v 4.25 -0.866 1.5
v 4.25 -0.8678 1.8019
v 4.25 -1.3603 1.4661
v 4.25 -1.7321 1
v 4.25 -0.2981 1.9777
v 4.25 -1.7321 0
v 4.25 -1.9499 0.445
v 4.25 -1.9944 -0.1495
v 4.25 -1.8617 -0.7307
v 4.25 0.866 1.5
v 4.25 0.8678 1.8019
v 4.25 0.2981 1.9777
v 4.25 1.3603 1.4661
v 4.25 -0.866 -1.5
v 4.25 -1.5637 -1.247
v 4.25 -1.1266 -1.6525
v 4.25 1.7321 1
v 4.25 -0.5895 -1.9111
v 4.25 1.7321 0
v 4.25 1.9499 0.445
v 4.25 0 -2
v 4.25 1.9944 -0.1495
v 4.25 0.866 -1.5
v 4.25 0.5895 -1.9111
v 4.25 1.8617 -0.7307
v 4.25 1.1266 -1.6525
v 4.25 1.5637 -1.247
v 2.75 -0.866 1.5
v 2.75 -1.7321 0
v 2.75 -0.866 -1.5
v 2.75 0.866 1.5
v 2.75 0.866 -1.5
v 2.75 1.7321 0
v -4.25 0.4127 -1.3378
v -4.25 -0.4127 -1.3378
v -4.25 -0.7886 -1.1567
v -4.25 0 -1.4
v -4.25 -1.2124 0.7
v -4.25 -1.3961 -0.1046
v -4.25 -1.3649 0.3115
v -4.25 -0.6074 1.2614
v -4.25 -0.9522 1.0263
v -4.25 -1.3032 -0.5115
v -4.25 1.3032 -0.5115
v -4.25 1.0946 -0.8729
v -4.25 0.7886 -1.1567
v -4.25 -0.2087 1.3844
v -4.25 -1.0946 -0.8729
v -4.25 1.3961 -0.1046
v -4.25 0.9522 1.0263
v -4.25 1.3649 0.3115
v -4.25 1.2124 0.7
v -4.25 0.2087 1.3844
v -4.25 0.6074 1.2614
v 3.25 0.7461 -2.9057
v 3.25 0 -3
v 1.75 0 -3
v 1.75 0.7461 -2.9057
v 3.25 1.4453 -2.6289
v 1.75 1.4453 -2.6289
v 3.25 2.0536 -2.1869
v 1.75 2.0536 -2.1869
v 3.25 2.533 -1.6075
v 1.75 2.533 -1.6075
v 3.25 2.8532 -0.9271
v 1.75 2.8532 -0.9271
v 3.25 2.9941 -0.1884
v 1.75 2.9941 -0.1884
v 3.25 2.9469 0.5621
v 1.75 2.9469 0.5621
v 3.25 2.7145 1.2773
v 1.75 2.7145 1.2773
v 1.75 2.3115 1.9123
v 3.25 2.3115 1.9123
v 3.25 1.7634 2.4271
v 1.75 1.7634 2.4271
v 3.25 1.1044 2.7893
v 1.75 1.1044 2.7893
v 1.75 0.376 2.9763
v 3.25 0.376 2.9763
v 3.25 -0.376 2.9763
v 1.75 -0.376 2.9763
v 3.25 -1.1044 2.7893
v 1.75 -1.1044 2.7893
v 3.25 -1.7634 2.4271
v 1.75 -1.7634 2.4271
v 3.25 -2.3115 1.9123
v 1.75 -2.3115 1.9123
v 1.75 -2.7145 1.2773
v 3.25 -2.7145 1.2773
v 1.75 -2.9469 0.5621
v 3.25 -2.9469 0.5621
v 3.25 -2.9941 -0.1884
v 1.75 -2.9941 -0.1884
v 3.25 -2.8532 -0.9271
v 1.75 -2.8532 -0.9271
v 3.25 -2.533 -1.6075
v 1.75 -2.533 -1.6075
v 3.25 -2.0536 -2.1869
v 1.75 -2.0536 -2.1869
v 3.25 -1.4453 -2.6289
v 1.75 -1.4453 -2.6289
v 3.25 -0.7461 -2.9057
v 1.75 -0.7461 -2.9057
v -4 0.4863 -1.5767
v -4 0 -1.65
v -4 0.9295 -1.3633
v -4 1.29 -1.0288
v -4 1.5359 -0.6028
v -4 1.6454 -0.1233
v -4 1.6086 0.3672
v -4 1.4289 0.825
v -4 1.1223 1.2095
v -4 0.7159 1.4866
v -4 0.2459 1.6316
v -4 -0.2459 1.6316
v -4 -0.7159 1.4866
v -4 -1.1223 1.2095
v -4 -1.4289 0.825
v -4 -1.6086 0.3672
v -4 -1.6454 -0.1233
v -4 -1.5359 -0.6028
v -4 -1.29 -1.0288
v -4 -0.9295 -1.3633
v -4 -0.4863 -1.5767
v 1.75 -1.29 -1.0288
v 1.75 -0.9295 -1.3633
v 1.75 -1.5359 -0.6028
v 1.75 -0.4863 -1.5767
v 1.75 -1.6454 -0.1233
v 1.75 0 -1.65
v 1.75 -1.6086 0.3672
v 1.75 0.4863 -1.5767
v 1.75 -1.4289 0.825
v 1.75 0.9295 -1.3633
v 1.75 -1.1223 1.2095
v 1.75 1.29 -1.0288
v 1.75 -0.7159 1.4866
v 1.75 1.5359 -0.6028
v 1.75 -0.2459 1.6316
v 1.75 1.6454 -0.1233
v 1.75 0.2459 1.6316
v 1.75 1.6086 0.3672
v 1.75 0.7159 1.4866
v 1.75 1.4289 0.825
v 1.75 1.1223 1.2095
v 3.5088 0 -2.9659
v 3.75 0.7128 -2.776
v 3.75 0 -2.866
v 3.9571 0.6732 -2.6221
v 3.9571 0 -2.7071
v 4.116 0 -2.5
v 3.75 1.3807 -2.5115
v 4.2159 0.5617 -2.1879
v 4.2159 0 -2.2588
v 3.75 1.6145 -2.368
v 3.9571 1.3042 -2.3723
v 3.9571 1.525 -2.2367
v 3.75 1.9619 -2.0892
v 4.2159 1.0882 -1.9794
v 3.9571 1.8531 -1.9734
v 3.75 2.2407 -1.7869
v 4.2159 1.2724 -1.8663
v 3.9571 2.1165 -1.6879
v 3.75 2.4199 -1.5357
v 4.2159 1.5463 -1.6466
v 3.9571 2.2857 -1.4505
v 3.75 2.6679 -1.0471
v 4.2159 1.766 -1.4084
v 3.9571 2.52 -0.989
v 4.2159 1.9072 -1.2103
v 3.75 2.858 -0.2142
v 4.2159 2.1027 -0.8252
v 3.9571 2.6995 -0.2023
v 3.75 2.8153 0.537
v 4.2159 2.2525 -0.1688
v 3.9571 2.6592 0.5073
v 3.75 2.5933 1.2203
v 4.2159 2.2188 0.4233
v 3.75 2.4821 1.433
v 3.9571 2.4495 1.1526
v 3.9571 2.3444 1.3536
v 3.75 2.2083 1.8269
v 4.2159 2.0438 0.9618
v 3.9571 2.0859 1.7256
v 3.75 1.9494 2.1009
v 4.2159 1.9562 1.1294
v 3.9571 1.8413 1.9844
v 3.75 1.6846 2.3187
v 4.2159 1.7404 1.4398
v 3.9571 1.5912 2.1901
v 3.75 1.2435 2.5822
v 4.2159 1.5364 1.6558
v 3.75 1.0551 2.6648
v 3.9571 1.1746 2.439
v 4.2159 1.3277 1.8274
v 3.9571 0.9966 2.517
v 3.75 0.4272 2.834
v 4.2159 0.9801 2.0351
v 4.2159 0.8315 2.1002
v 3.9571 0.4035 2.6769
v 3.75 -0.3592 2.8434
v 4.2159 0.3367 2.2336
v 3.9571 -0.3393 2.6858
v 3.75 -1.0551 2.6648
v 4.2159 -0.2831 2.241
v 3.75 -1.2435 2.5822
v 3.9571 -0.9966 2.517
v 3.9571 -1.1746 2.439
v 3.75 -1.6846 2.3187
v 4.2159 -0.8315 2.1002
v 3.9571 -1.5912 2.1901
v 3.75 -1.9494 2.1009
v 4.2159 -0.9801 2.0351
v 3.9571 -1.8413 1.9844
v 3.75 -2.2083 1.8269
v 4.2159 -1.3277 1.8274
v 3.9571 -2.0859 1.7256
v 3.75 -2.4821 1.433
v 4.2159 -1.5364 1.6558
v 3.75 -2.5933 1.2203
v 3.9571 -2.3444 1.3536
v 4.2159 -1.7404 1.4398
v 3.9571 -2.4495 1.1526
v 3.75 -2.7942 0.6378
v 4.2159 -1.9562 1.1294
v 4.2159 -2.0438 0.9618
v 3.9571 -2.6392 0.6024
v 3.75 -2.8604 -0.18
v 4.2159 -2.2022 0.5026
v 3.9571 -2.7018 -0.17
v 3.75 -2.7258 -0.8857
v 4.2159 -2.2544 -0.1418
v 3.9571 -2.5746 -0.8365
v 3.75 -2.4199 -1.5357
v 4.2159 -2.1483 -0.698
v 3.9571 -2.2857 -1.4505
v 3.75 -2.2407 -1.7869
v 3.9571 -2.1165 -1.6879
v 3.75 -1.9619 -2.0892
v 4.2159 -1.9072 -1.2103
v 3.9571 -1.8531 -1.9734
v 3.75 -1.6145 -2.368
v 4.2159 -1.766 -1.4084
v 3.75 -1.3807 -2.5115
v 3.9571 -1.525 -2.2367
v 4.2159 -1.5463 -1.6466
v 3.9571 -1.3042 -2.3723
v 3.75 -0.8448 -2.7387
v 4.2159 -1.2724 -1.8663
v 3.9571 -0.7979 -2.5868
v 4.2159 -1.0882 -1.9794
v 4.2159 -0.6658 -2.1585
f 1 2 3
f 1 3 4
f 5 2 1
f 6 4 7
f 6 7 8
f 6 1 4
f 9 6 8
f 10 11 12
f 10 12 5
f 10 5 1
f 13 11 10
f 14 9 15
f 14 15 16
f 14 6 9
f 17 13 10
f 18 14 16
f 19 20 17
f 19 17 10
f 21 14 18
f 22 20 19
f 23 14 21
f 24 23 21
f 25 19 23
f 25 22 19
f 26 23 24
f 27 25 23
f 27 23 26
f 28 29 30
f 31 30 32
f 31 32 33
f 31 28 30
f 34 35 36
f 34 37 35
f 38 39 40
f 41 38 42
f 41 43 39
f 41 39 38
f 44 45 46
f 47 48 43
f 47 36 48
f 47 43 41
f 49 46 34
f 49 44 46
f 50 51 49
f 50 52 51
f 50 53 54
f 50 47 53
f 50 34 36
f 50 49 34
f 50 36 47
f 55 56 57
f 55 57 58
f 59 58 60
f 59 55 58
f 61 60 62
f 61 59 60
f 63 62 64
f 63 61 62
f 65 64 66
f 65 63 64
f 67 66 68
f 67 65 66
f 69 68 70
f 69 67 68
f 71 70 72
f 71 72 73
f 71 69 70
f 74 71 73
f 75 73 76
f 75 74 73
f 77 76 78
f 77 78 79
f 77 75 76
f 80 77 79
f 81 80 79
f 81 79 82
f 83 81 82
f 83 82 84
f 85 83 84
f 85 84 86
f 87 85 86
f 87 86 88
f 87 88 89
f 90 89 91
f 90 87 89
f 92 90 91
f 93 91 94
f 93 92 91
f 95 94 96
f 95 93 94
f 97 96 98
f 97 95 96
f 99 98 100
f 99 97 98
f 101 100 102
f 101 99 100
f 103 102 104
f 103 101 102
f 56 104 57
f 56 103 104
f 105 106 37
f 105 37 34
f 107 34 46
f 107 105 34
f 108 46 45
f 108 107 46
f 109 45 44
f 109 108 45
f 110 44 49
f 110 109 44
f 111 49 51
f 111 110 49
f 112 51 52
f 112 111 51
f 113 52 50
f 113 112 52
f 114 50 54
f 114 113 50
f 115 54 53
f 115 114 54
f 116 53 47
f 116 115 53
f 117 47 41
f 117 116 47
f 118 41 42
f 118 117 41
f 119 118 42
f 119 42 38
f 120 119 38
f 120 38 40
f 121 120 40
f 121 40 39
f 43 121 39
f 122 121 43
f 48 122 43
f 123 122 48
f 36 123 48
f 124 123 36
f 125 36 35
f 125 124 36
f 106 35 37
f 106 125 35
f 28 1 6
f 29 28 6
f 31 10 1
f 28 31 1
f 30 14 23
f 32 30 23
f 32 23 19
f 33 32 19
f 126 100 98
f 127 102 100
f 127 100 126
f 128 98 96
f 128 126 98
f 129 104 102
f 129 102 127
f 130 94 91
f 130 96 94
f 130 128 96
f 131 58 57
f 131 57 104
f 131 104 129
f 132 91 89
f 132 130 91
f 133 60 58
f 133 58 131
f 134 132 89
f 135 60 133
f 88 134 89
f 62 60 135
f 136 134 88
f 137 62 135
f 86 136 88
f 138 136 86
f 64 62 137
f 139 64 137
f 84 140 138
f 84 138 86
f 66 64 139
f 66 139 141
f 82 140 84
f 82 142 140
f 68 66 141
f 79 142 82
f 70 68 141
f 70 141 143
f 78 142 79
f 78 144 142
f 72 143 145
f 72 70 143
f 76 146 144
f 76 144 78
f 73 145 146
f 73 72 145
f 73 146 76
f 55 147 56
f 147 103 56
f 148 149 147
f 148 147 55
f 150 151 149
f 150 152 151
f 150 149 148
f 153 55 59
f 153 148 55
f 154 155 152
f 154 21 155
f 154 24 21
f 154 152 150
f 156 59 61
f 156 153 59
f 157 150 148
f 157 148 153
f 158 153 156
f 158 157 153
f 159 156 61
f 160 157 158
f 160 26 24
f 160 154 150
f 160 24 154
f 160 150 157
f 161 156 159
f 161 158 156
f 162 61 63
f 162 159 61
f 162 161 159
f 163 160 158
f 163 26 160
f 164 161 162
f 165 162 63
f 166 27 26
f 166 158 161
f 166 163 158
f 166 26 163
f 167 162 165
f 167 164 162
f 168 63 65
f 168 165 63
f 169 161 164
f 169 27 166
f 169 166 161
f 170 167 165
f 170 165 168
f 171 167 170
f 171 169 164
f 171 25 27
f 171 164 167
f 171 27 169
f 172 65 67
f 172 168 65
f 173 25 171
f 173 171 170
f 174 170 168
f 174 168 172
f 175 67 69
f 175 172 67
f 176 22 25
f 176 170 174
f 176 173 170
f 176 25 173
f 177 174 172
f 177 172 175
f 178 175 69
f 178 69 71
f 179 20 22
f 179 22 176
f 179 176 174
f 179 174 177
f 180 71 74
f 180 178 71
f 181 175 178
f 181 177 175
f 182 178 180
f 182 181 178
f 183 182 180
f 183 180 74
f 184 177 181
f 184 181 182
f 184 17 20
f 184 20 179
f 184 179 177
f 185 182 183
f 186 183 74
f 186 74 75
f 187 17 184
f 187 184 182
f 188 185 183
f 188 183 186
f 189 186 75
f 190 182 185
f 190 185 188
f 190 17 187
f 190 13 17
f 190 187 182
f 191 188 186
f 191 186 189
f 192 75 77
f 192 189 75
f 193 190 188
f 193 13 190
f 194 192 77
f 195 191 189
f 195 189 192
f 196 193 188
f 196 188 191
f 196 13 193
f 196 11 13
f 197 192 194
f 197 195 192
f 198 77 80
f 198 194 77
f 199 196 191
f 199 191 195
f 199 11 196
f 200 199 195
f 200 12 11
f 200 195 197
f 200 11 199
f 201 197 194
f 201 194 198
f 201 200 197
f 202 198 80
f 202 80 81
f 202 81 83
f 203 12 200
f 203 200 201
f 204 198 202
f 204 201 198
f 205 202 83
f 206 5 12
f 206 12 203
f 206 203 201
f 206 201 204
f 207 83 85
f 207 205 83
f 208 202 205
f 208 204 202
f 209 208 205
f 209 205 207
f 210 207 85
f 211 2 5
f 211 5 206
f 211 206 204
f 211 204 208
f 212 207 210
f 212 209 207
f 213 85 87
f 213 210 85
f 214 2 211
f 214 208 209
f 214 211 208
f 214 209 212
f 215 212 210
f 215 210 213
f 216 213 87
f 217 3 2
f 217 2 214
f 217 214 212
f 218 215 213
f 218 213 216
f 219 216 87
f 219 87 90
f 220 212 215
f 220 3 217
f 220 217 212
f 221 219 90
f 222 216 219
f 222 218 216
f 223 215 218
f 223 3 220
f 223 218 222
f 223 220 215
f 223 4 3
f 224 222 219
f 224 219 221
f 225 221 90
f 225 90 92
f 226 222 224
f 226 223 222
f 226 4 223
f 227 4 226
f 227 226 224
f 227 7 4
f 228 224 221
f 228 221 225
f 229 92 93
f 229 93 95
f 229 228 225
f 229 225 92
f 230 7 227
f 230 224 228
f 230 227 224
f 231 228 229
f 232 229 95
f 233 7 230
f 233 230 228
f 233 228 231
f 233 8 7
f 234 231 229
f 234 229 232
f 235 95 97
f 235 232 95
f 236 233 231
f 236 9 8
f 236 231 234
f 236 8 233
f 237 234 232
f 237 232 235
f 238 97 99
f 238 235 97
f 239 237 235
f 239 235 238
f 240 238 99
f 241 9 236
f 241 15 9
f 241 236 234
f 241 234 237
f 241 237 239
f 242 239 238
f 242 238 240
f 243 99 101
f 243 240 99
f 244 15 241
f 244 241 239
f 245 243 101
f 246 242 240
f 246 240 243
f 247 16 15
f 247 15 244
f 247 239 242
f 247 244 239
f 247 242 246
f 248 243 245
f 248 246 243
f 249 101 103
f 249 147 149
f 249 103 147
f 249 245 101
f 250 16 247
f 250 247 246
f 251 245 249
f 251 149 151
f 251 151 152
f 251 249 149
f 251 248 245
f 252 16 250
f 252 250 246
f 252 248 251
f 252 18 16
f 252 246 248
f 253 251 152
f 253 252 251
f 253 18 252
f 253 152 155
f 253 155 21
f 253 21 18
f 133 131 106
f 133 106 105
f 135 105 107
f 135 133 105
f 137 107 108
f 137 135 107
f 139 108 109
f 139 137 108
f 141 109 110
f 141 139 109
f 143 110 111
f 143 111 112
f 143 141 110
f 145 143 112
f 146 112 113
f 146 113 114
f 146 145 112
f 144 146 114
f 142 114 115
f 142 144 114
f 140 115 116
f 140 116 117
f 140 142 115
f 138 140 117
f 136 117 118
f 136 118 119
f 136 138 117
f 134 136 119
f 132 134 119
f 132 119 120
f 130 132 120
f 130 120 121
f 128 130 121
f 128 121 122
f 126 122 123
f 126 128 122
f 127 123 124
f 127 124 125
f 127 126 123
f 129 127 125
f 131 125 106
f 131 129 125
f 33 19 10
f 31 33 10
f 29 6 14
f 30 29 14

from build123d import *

# Parameters (mm, degrees)
F2_SIZE2 = 0.25
F2_SIZE  = 0.25
F3_R     = 1
F5_DEPTH = 1.5


with BuildPart() as f1:
    # F0 (on Front) → F1 (revolve)
    with BuildSketch(Plane.XZ):
        Polygon((4.25, 0), (-4.25, 0), (-4.25, -1.65), (1.75, -1.65), (1.75, -3), (4.25, -3), align=None)
    revolve(axis=Axis((4.160319, 0, 0), (1, 0, 0)))

    # F2
    f2_edges = [f1.edges().sort_by_distance(p)[0] for p in [
        (-4.25, 0, 1.65),
    ]]
    chamfer(f2_edges, length=F2_SIZE, length2=F2_SIZE2)

    # F3
    f3_edges = [f1.edges().sort_by_distance(p)[0] for p in [
        (4.25, 0, 3),
    ]]
    fillet(f3_edges, radius=F3_R)

    # F4 (on face) → F5 (cut)
    with BuildSketch(Plane.YZ.offset(4.25)):
        Polygon((0.866025, 1.5), (-0.866025, 1.5), (-1.732051, 0), (-0.866025, -1.5), (0.866025, -1.5), (1.732051, 0), align=None)
    extrude(amount=-F5_DEPTH, mode=Mode.SUBTRACT)


solid = f1.part
